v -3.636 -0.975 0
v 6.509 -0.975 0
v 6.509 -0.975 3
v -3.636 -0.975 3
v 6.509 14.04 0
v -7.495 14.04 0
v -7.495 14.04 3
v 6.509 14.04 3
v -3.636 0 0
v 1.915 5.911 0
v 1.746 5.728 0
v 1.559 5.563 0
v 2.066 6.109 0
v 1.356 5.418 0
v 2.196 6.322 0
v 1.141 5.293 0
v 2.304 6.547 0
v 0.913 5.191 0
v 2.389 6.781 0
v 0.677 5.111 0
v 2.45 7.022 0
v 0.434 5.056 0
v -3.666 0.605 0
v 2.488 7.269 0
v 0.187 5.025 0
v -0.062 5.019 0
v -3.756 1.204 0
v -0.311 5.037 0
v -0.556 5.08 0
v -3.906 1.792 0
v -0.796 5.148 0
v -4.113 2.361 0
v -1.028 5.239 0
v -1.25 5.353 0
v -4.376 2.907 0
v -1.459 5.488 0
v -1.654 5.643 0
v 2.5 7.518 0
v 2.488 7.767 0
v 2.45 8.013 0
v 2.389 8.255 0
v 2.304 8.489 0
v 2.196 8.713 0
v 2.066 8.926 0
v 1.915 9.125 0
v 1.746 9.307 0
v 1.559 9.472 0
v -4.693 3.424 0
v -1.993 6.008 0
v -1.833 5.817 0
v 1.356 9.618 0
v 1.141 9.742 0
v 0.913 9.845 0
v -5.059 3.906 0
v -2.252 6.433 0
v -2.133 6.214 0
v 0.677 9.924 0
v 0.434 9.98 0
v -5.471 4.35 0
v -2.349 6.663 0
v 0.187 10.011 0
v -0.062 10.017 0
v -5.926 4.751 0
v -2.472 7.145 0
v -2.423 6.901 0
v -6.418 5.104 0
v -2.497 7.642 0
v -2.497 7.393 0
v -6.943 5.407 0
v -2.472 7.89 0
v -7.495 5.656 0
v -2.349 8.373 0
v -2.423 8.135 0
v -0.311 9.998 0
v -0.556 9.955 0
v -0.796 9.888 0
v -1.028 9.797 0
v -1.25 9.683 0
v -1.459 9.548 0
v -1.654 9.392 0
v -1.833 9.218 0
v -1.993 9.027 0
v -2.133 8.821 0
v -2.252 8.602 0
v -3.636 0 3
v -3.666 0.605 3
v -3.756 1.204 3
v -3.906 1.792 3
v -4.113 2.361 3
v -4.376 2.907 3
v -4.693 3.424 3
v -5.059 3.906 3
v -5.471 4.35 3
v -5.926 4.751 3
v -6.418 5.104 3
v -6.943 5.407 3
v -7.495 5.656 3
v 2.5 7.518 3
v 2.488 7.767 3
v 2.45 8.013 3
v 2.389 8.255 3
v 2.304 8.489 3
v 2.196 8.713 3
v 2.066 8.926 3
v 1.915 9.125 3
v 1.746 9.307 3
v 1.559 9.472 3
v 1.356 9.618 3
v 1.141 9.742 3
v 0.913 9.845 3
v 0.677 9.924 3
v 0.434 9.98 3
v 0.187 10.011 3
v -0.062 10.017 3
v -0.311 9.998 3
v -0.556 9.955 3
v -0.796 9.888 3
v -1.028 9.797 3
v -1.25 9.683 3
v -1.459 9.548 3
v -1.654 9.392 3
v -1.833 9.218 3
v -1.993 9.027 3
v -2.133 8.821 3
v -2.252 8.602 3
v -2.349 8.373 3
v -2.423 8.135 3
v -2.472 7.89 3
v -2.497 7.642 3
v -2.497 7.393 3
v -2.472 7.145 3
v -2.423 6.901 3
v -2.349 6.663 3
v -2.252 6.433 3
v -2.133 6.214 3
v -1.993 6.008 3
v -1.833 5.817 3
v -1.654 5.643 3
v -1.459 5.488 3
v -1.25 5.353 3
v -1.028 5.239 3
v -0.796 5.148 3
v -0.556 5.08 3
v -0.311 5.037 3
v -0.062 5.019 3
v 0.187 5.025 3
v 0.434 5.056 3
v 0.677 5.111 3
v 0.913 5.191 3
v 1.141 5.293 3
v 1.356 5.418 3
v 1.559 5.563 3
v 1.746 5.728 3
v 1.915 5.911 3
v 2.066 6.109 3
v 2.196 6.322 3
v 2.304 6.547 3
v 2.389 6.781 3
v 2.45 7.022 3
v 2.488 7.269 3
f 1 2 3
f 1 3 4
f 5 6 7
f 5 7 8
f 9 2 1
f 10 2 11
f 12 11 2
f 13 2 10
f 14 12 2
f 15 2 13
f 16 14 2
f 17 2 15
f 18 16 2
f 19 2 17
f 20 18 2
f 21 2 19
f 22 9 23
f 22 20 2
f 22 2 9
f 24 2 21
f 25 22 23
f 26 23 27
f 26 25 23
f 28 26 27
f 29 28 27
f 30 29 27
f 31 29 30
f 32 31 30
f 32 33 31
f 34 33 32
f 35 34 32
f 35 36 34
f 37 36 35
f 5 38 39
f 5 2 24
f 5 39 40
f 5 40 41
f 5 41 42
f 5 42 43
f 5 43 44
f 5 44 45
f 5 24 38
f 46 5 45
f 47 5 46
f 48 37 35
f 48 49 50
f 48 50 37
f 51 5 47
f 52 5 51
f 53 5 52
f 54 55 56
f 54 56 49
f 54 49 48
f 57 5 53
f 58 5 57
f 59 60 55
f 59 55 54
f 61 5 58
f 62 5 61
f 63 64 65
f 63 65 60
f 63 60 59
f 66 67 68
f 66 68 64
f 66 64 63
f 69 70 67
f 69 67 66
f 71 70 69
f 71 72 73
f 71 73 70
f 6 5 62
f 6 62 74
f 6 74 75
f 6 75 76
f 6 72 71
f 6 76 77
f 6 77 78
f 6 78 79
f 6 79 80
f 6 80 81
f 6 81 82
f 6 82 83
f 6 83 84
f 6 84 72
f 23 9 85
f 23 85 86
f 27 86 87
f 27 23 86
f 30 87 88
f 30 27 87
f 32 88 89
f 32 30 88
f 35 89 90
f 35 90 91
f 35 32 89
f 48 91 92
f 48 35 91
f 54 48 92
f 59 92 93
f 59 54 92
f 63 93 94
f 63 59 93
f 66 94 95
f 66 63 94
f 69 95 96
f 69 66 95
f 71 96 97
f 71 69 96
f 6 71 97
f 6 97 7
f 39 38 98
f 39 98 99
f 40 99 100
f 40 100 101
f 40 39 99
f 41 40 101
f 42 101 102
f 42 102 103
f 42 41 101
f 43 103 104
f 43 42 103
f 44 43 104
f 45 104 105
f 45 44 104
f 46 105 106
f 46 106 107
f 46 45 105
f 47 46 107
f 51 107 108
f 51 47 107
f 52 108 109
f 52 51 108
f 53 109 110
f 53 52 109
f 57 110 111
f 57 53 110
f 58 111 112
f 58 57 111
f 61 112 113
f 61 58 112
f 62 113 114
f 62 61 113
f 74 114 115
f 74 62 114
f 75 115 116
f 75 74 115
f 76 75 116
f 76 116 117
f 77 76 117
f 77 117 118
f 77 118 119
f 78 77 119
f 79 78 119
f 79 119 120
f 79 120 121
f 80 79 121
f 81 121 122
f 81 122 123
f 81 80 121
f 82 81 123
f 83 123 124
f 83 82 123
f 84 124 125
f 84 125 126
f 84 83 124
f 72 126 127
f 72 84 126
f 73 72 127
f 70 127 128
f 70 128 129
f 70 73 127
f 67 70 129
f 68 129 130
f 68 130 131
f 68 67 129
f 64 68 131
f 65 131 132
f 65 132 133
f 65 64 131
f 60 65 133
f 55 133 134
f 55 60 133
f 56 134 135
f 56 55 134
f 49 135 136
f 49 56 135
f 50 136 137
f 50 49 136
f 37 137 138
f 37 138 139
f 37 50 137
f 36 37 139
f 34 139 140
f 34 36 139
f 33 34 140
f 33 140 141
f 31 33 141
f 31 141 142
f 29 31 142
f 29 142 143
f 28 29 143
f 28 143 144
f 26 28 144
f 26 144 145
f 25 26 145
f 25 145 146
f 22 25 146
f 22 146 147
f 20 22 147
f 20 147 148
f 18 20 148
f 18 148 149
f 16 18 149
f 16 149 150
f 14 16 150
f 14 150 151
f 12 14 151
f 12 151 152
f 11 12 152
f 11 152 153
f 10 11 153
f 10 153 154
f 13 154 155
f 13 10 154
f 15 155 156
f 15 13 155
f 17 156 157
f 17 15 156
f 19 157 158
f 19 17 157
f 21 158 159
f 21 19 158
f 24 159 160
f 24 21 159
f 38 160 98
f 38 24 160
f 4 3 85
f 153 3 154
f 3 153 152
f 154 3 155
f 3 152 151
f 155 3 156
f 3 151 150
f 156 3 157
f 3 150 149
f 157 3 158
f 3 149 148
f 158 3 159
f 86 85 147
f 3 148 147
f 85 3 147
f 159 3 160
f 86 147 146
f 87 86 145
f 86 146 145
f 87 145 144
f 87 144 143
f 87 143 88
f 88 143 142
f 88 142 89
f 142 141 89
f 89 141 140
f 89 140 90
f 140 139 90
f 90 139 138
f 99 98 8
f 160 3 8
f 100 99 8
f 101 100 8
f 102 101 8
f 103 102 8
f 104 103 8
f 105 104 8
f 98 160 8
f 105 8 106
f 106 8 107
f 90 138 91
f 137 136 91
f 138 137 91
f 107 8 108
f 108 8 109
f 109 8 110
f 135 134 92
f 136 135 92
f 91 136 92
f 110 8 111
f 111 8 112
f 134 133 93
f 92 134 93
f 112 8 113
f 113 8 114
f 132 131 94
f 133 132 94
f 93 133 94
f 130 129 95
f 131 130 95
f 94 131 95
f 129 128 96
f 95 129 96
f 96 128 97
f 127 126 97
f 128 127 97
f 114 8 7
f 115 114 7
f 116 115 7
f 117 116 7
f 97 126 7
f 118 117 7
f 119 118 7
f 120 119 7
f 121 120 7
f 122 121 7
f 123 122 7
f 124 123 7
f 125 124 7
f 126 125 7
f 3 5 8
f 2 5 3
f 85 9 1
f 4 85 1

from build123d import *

# Parameters (mm, degrees)
SKETCH_R      = 2.5
EXTRUDE_DEPTH = 3


with BuildPart() as part:
    # Sketch → Extrude (new body)
    with BuildSketch(Plane.XY):
        with BuildLine():
            Line((-7.495407, 14.040454), (6.508806, 14.040454))
            Line((6.508806, 14.040454), (6.508806, 0))
            Line((6.508806, 0), (6.508806, -0.974619))
            Line((6.508806, -0.974619), (-3.635789, -0.974619))
            Line((-3.635789, 0), (-3.635789, -0.974619))
            ThreePointArc((-3.635789, 0), (-4.692641, 3.423621), (-7.495407, 5.6558))
            Line((-7.495407, 5.6558), (-7.495407, 14.040454))
        make_face()
        with Locations((0, 7.517769)):
            Circle(SKETCH_R, mode=Mode.SUBTRACT)
    extrude(amount=EXTRUDE_DEPTH)


solid = part.part
